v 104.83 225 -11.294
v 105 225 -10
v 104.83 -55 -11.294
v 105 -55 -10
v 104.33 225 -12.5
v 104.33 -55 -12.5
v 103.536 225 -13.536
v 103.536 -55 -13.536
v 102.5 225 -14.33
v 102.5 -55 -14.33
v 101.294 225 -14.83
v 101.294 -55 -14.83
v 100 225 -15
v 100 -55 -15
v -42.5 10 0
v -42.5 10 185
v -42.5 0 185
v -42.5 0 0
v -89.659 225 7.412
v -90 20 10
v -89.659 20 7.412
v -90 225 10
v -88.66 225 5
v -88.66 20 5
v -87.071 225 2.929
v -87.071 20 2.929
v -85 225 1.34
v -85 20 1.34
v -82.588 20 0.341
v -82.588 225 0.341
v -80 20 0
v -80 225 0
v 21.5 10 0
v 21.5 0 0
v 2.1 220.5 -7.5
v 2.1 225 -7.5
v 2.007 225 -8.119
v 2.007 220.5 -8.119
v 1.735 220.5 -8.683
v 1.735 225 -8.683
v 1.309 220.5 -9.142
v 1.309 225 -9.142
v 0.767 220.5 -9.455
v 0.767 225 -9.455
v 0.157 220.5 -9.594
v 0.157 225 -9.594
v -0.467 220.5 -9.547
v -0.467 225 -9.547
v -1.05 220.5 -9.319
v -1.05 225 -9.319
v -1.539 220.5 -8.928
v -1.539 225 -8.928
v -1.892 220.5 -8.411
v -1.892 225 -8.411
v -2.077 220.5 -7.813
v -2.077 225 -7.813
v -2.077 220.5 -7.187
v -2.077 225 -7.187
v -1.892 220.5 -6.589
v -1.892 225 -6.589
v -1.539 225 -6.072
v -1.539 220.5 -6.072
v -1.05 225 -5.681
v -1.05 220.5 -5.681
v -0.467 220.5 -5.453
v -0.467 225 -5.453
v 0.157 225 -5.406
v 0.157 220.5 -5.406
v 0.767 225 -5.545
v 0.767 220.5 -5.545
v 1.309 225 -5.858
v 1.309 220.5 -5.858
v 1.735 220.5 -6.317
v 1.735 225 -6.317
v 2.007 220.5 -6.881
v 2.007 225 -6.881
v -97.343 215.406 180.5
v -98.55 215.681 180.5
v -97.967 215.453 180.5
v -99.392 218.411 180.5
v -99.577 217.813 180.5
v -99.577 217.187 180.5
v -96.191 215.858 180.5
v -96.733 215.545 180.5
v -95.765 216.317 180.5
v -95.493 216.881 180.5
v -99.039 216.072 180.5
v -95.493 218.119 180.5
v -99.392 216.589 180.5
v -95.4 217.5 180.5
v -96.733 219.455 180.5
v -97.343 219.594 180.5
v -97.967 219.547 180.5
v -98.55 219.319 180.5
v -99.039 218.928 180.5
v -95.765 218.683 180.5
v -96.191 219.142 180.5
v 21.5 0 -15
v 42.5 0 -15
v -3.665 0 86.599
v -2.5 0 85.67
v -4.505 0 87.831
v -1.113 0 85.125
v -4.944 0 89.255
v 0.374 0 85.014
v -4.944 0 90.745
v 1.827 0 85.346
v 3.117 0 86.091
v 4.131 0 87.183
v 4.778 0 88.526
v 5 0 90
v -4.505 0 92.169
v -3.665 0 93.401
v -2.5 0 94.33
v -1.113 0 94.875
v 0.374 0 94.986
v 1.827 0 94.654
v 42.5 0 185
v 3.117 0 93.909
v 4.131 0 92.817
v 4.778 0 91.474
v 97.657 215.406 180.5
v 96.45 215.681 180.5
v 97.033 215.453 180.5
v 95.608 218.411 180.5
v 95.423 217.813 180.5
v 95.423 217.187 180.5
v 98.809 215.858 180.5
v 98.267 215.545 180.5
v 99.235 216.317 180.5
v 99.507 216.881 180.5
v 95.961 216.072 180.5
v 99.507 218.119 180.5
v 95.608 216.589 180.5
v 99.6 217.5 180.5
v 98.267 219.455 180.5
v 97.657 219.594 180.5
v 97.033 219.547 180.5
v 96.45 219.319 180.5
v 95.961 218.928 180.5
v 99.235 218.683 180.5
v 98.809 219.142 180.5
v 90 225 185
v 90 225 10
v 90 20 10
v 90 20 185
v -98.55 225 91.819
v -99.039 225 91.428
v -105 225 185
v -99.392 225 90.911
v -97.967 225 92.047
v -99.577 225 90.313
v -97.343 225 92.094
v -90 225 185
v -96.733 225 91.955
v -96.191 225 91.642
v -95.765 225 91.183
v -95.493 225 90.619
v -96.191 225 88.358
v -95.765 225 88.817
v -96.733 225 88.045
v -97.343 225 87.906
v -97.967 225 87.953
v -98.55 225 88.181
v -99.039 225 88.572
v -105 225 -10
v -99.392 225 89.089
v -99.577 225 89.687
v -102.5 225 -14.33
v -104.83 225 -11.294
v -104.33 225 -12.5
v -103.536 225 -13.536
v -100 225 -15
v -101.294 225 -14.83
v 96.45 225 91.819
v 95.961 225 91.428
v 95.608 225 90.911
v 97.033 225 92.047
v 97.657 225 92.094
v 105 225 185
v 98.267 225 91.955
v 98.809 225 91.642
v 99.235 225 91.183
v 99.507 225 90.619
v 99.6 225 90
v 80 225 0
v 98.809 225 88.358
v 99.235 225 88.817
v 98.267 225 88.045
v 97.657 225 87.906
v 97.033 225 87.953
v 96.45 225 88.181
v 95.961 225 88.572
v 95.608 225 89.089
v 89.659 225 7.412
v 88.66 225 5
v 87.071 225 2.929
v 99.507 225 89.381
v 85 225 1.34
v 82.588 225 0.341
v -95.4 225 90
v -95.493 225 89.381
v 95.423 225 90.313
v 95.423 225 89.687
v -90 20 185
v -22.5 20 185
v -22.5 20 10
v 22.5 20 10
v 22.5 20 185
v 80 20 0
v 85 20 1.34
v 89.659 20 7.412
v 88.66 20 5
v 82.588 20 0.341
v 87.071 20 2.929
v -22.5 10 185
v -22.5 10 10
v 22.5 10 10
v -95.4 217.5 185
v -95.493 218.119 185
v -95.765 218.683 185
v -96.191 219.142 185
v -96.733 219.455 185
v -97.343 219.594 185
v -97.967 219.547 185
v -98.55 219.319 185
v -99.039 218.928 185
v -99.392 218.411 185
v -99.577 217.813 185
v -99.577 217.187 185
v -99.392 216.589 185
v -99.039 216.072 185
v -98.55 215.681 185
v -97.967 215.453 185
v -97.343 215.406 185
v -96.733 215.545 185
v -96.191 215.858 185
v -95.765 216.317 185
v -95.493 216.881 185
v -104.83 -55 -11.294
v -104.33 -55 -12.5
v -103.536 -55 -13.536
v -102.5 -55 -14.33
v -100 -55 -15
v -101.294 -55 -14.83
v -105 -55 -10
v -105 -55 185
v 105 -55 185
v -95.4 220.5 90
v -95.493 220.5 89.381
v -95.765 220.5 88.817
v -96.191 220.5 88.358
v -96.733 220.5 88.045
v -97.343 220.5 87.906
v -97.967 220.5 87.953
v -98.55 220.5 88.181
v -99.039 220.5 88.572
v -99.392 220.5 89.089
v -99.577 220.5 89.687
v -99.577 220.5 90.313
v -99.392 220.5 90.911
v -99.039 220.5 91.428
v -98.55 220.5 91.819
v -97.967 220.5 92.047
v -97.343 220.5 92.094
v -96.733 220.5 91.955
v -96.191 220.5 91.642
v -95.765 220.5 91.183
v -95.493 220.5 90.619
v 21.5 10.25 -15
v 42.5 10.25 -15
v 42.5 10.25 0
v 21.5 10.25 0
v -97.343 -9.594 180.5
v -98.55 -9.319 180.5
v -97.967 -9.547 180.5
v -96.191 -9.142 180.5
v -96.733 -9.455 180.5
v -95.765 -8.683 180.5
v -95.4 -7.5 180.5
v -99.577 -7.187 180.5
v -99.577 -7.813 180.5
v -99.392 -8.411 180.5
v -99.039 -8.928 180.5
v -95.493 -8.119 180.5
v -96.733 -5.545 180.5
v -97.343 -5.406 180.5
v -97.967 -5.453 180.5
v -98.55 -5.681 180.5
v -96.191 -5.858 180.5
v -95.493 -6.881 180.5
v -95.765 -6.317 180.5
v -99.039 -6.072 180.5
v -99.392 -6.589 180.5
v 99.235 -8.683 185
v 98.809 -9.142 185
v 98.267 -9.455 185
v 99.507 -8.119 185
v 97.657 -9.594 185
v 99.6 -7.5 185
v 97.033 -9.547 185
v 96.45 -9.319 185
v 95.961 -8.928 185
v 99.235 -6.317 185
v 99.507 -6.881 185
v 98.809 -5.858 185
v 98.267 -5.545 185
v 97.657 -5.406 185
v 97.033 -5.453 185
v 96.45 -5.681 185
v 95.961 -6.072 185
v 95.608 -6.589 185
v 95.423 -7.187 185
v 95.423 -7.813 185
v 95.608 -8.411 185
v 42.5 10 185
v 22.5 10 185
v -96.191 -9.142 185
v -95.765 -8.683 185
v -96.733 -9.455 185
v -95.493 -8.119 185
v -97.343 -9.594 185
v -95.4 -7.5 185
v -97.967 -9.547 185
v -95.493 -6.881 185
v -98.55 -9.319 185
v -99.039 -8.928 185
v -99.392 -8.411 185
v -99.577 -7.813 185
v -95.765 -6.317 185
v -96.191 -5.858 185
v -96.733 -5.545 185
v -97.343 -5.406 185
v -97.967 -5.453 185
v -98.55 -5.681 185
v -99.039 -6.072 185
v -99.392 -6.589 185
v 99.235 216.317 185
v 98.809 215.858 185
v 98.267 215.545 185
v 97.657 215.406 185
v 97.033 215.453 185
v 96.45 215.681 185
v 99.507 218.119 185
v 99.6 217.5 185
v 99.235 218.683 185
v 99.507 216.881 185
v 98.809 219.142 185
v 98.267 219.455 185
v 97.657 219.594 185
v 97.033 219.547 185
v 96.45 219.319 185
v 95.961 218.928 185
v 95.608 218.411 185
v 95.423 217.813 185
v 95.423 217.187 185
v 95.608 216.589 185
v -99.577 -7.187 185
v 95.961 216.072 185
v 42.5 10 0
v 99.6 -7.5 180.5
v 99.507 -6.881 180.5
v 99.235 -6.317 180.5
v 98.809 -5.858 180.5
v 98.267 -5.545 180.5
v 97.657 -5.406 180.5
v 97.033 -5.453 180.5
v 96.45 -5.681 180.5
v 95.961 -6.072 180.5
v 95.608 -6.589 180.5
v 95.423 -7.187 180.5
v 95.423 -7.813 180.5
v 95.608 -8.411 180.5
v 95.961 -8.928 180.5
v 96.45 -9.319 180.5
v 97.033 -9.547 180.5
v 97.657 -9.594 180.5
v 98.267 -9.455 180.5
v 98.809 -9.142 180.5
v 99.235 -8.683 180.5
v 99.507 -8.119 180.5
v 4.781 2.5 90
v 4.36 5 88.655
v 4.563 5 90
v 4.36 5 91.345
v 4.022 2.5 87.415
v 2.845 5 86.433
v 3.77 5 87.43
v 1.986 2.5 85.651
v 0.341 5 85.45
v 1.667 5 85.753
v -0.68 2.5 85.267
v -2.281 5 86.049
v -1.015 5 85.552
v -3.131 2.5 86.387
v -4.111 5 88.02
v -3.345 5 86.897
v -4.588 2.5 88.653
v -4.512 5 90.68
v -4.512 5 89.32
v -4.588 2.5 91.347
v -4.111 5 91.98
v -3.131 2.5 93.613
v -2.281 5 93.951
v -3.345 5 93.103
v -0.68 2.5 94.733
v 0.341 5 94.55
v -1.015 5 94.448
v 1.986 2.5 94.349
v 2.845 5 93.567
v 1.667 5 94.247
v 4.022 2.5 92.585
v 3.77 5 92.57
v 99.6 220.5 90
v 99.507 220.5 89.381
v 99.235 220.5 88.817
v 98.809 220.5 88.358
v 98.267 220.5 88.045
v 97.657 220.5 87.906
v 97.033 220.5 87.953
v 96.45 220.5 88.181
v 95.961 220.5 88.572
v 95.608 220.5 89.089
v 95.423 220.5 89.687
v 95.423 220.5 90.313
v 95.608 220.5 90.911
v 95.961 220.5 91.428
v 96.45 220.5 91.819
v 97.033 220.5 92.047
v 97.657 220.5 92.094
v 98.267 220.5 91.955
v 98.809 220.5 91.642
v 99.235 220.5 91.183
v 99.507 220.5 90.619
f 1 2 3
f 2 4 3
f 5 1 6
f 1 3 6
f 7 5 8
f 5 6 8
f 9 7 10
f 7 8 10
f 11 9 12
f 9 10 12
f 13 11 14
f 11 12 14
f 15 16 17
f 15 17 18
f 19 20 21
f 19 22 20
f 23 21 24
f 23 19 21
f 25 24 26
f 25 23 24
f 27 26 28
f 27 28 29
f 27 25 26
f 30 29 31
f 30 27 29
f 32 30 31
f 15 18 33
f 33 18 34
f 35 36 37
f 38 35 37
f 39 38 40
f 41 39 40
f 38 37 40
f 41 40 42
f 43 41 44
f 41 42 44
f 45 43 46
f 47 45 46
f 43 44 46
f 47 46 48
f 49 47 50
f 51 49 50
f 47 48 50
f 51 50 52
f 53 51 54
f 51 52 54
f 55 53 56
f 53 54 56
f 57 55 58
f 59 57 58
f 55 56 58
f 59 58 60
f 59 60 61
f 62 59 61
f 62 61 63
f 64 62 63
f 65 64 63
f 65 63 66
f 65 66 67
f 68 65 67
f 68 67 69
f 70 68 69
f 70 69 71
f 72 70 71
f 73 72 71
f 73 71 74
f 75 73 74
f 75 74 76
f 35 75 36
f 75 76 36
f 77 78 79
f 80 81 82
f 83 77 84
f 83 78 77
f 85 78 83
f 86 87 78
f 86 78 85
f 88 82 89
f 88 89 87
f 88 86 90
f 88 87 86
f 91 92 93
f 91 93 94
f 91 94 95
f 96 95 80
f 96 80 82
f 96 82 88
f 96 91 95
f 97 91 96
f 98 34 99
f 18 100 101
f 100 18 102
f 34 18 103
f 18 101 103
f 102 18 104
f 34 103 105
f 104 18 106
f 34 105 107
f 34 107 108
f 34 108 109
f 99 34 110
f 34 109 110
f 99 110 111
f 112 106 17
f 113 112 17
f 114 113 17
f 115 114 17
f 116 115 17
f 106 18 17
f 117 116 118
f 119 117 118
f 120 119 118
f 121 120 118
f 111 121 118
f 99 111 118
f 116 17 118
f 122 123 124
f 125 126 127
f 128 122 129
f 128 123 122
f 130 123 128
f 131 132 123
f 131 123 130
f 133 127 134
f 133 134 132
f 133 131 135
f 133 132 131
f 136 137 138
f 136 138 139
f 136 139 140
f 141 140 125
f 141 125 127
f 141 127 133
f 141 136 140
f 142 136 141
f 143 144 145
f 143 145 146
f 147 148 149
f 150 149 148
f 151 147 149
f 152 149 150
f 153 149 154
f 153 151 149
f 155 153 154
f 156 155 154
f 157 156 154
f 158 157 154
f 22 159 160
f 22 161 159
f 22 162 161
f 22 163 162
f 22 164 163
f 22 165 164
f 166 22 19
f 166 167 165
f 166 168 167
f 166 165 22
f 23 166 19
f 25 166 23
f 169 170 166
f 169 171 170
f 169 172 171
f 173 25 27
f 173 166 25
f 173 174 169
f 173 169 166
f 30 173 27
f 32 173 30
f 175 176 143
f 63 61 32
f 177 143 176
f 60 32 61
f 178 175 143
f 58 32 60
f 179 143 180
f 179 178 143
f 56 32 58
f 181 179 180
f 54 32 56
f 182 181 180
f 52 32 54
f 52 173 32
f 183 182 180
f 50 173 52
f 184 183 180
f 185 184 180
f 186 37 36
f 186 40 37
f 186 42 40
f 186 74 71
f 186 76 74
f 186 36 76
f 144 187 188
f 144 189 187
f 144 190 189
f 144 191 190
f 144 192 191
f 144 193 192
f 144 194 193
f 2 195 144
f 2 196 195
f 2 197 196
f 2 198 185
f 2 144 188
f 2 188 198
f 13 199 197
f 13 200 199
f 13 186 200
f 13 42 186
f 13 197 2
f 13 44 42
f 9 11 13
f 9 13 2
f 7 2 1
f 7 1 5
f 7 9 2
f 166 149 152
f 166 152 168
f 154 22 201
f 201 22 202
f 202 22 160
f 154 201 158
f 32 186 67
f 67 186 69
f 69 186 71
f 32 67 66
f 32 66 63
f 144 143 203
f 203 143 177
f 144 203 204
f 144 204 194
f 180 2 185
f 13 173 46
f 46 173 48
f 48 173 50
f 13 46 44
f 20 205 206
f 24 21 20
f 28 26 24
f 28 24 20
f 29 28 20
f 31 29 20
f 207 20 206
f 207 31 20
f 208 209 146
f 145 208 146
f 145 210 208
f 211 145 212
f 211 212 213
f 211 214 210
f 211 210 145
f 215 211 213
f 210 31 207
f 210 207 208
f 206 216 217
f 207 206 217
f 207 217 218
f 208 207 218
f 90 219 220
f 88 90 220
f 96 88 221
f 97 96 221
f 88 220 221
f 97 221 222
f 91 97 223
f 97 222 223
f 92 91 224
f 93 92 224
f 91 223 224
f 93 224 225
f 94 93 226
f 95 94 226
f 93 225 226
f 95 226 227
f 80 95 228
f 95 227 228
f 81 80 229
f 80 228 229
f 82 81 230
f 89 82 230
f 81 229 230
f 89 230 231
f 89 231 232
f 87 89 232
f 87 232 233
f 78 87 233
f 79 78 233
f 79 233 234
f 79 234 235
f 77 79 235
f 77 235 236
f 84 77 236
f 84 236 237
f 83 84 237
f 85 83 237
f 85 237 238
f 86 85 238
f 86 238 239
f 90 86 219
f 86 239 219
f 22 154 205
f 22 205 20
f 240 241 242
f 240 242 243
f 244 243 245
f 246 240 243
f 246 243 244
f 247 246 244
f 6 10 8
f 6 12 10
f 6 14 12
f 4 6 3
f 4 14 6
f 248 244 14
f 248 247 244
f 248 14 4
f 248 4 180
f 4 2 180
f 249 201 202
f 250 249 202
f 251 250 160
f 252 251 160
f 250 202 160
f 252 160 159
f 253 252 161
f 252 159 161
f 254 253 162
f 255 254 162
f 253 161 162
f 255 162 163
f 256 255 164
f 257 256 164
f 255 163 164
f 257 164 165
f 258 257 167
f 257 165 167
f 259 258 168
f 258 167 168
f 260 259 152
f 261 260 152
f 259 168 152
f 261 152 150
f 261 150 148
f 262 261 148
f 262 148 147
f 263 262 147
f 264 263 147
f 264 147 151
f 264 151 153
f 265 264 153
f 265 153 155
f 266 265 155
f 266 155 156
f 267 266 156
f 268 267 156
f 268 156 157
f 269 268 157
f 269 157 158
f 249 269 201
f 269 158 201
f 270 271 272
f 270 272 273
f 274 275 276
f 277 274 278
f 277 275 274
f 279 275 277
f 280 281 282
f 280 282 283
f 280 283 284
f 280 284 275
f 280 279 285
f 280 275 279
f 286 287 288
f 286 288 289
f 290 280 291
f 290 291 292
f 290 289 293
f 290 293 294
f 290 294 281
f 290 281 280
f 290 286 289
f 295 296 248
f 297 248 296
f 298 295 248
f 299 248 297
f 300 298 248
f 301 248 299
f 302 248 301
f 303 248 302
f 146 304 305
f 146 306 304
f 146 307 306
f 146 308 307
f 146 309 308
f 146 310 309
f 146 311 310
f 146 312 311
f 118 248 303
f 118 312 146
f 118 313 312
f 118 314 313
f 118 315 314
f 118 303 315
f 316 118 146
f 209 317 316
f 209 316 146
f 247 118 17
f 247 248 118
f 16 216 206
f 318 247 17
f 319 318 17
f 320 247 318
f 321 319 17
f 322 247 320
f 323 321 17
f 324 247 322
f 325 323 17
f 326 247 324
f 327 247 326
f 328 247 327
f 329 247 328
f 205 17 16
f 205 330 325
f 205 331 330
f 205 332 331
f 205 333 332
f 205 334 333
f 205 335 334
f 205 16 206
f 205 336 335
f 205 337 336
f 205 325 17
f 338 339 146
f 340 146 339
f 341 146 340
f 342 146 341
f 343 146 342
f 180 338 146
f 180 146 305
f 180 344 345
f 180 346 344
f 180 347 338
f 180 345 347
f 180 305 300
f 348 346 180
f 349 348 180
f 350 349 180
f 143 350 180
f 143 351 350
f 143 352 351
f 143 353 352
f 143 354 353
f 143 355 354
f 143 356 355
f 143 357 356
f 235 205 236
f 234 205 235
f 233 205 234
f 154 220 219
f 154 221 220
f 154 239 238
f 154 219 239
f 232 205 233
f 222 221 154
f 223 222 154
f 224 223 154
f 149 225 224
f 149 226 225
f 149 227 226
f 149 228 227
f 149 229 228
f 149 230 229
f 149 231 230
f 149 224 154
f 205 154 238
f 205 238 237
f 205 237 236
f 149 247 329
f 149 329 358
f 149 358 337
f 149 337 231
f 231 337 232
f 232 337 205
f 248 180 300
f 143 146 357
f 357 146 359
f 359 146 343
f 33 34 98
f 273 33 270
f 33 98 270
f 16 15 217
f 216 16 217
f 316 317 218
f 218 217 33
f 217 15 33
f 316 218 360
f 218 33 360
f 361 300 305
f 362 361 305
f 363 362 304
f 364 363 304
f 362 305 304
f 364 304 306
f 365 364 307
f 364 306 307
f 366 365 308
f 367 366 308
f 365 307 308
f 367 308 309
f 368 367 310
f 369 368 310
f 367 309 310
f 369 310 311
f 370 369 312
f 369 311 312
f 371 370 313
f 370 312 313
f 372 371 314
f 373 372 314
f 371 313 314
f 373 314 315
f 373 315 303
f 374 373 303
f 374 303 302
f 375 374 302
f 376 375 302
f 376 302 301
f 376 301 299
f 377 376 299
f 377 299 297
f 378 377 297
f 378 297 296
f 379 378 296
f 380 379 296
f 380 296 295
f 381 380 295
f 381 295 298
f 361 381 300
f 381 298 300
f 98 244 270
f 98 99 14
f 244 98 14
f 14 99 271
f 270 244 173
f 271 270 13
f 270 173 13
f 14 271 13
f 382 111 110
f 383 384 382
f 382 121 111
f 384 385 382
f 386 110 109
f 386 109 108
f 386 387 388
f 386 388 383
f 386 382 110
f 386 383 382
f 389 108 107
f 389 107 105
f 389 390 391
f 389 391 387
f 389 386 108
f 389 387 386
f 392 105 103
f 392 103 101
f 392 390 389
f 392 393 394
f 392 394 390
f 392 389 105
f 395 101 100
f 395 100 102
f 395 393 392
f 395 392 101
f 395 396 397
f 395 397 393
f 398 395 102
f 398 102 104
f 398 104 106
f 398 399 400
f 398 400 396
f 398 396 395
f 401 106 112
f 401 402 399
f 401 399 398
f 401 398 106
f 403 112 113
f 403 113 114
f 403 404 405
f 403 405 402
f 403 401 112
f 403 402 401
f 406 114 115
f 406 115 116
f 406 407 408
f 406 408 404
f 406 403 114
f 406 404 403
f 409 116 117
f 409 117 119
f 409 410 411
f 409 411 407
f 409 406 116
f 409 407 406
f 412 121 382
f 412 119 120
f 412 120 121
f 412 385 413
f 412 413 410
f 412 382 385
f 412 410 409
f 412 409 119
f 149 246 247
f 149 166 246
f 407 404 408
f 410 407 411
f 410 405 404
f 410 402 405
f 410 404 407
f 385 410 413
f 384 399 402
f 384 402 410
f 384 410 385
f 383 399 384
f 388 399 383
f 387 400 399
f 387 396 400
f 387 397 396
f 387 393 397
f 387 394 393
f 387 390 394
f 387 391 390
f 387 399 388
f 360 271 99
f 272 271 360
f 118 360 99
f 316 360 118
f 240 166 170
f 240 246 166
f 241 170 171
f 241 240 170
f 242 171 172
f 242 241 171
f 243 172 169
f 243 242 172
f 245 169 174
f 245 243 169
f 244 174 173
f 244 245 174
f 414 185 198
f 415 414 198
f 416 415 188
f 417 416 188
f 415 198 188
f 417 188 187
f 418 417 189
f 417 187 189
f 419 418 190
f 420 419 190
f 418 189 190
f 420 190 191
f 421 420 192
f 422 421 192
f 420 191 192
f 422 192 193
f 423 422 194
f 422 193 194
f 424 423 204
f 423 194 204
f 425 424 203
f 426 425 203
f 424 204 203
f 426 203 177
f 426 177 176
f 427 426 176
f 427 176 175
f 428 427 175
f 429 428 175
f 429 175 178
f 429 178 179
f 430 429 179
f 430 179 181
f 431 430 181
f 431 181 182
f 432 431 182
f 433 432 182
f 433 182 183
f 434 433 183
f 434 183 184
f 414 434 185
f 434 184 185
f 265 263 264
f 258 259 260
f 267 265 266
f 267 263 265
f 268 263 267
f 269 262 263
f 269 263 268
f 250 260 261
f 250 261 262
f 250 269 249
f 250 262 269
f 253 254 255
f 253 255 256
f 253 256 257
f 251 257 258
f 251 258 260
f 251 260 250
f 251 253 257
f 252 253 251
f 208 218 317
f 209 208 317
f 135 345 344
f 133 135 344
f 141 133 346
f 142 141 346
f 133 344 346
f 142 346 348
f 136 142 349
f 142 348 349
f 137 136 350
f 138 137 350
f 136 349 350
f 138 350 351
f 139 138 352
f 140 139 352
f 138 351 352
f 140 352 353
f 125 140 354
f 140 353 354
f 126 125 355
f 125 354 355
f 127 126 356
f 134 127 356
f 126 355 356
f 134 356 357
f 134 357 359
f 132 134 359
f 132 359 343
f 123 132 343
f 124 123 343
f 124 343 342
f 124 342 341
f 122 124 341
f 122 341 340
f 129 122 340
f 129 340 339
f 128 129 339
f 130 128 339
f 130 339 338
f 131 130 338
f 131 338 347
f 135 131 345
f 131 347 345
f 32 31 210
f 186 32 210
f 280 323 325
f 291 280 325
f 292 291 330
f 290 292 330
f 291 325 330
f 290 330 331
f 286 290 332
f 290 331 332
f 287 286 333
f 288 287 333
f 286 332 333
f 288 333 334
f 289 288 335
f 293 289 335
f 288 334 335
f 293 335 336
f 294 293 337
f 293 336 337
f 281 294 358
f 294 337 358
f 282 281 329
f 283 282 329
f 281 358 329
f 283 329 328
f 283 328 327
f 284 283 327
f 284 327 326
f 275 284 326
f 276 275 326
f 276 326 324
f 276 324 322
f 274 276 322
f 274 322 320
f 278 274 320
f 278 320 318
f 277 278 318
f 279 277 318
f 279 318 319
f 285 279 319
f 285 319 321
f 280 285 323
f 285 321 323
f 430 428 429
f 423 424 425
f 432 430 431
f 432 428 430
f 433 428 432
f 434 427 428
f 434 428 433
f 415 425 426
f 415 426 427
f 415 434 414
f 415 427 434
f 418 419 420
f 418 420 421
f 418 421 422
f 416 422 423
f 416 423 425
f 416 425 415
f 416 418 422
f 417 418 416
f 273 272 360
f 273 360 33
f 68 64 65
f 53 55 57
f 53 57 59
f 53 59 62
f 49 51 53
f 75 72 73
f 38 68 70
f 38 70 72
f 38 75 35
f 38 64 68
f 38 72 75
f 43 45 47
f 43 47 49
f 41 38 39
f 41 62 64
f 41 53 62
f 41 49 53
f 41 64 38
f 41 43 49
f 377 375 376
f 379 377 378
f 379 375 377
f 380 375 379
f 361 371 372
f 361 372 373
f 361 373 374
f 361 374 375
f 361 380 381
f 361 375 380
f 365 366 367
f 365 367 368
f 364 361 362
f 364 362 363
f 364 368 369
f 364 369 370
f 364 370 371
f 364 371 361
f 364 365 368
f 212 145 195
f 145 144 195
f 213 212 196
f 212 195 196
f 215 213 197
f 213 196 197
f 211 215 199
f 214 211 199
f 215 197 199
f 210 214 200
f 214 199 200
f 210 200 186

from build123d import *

# Parameters (mm, degrees)
BOSS_EXTRUDE1_DEPTH = 225
BOSS_EXTRUDE2_DEPTH = 10
SKETCH6_W           = 210
SKETCH6_H           = 200
BOSS_EXTRUDE3_DEPTH = 15
SKETCH5_R           = 2.1
CUT_EXTRUDE1_DEPTH  = 4.5
SKETCH10_W          = 210
SKETCH10_H          = 200
BOSS_EXTRUDE4_DEPTH = 40
SKETCH11_R          = 5
BOSS_EXTRUDE5_DEPTH = 5
BOSS_EXTRUDE5_TAPER = 5
SKETCH13_W          = 185
SKETCH13_H          = 10
BOSS_EXTRUDE6_DEPTH = 47.5
SKETCH14_W          = 185
SKETCH14_H          = 10
BOSS_EXTRUDE7_DEPTH = 47.5
SKETCH7_W           = 21
SKETCH7_H           = 10.25
CUT_EXTRUDE2_DEPTH  = 15
SKETCH15_R          = 2.1
CUT_EXTRUDE4_DEPTH  = 4.5
FILLET2_R           = 10
FILLET4_R           = 5


with BuildPart() as part:
    # Sketch2 → Boss-Extrude1 (new body)
    with BuildSketch(Plane(origin=(0, 0, 0), x_dir=(1, 0, 0), z_dir=(0, 1, 0))):
        Polygon((-90, 0), (90, 0), (90, -185), (105, -185), (105, 15), (-105, 15), (-105, -185), (-90, -185), align=None)
    extrude(amount=BOSS_EXTRUDE1_DEPTH)

    # Sketch3 → Boss-Extrude2 (add)
    with BuildSketch(Plane(origin=(0, 10, 0), x_dir=(1, 0, 0), z_dir=(0, 1, 0))):
        Polygon((-90, -185), (-22.5, -185), (-22.5, -10), (22.5, -10), (22.5, -185), (90, -185), (90, 0), (-90, 0), align=None)
    extrude(amount=BOSS_EXTRUDE2_DEPTH)

    # Sketch6 → Boss-Extrude3 (add)
    with BuildSketch(Plane.XZ):
        with Locations((0, 85)):
            Rectangle(SKETCH6_W, SKETCH6_H)
    extrude(amount=BOSS_EXTRUDE3_DEPTH)

    # Sketch5 → Cut-Extrude1 (cut)
    with BuildSketch(Plane.XY.offset(185)):
        with Locations((-97.5, 217.5)):
            Circle(SKETCH5_R)
        with Locations((97.5, 217.5)):
            Circle(SKETCH5_R)
        with Locations((-97.5, -7.5)):
            Circle(SKETCH5_R)
        with Locations((97.5, -7.5)):
            Circle(SKETCH5_R)
    extrude(amount=-CUT_EXTRUDE1_DEPTH, mode=Mode.SUBTRACT)

    # Sketch10 → Boss-Extrude4 (add)
    with BuildSketch(Plane.XZ.offset(15)):
        with Locations((0, 85)):
            Rectangle(SKETCH10_W, SKETCH10_H)
    extrude(amount=BOSS_EXTRUDE4_DEPTH)

    # Sketch11 → Boss-Extrude5 (add)
    with BuildSketch(Plane(origin=(0, 0, 0), x_dir=(1, 0, 0), z_dir=(0, 1, 0))):
        with Locations((0, -90)):
            Circle(SKETCH11_R)
    extrude(amount=BOSS_EXTRUDE5_DEPTH, taper=BOSS_EXTRUDE5_TAPER)

    # Sketch13 → Boss-Extrude6 (add)
    with BuildSketch(Plane.ZY.offset(-90)):
        with Locations((92.5, 5)):
            Rectangle(SKETCH13_W, SKETCH13_H)
    extrude(amount=BOSS_EXTRUDE6_DEPTH)

    # Sketch14 → Boss-Extrude7 (add)
    with BuildSketch(Plane(origin=(-90, 0, 0), x_dir=(0, 0, -1), z_dir=(1, 0, 0))):
        with Locations((-92.5, 5)):
            Rectangle(SKETCH14_W, SKETCH14_H)
    extrude(amount=BOSS_EXTRUDE7_DEPTH)

    # Sketch7 → Cut-Extrude2 (cut)
    with BuildSketch(Plane(origin=(0, 0, -15), x_dir=(-1, 0, 0), z_dir=(0, 0, -1))):
        with Locations((-32, 5.125)):
            Rectangle(SKETCH7_W, SKETCH7_H)
    extrude(amount=-CUT_EXTRUDE2_DEPTH, mode=Mode.SUBTRACT)

    # Sketch15 → Cut-Extrude4 (cut)
    with BuildSketch(Plane(origin=(0, 225, 0), x_dir=(1, 0, 0), z_dir=(0, 1, 0))):
        with Locations((0, 7.5)):
            Circle(SKETCH15_R)
        with Locations((-97.5, -90)):
            Circle(SKETCH15_R)
        with Locations((97.5, -90)):
            Circle(SKETCH15_R)
    extrude(amount=-CUT_EXTRUDE4_DEPTH, mode=Mode.SUBTRACT)

    # Fillet2
    fillet2_edges = [part.edges().sort_by_distance(p)[0] for p in [
        (90, 122.5, 0),
        (-90, 122.5, 0),
    ]]
    fillet(fillet2_edges, radius=FILLET2_R)

    # Fillet4
    fillet4_edges = [part.edges().sort_by_distance(p)[0] for p in [
        (-105, 85, -15),
        (105, 85, -15),
    ]]
    fillet(fillet4_edges, radius=FILLET4_R)


solid = part.part
